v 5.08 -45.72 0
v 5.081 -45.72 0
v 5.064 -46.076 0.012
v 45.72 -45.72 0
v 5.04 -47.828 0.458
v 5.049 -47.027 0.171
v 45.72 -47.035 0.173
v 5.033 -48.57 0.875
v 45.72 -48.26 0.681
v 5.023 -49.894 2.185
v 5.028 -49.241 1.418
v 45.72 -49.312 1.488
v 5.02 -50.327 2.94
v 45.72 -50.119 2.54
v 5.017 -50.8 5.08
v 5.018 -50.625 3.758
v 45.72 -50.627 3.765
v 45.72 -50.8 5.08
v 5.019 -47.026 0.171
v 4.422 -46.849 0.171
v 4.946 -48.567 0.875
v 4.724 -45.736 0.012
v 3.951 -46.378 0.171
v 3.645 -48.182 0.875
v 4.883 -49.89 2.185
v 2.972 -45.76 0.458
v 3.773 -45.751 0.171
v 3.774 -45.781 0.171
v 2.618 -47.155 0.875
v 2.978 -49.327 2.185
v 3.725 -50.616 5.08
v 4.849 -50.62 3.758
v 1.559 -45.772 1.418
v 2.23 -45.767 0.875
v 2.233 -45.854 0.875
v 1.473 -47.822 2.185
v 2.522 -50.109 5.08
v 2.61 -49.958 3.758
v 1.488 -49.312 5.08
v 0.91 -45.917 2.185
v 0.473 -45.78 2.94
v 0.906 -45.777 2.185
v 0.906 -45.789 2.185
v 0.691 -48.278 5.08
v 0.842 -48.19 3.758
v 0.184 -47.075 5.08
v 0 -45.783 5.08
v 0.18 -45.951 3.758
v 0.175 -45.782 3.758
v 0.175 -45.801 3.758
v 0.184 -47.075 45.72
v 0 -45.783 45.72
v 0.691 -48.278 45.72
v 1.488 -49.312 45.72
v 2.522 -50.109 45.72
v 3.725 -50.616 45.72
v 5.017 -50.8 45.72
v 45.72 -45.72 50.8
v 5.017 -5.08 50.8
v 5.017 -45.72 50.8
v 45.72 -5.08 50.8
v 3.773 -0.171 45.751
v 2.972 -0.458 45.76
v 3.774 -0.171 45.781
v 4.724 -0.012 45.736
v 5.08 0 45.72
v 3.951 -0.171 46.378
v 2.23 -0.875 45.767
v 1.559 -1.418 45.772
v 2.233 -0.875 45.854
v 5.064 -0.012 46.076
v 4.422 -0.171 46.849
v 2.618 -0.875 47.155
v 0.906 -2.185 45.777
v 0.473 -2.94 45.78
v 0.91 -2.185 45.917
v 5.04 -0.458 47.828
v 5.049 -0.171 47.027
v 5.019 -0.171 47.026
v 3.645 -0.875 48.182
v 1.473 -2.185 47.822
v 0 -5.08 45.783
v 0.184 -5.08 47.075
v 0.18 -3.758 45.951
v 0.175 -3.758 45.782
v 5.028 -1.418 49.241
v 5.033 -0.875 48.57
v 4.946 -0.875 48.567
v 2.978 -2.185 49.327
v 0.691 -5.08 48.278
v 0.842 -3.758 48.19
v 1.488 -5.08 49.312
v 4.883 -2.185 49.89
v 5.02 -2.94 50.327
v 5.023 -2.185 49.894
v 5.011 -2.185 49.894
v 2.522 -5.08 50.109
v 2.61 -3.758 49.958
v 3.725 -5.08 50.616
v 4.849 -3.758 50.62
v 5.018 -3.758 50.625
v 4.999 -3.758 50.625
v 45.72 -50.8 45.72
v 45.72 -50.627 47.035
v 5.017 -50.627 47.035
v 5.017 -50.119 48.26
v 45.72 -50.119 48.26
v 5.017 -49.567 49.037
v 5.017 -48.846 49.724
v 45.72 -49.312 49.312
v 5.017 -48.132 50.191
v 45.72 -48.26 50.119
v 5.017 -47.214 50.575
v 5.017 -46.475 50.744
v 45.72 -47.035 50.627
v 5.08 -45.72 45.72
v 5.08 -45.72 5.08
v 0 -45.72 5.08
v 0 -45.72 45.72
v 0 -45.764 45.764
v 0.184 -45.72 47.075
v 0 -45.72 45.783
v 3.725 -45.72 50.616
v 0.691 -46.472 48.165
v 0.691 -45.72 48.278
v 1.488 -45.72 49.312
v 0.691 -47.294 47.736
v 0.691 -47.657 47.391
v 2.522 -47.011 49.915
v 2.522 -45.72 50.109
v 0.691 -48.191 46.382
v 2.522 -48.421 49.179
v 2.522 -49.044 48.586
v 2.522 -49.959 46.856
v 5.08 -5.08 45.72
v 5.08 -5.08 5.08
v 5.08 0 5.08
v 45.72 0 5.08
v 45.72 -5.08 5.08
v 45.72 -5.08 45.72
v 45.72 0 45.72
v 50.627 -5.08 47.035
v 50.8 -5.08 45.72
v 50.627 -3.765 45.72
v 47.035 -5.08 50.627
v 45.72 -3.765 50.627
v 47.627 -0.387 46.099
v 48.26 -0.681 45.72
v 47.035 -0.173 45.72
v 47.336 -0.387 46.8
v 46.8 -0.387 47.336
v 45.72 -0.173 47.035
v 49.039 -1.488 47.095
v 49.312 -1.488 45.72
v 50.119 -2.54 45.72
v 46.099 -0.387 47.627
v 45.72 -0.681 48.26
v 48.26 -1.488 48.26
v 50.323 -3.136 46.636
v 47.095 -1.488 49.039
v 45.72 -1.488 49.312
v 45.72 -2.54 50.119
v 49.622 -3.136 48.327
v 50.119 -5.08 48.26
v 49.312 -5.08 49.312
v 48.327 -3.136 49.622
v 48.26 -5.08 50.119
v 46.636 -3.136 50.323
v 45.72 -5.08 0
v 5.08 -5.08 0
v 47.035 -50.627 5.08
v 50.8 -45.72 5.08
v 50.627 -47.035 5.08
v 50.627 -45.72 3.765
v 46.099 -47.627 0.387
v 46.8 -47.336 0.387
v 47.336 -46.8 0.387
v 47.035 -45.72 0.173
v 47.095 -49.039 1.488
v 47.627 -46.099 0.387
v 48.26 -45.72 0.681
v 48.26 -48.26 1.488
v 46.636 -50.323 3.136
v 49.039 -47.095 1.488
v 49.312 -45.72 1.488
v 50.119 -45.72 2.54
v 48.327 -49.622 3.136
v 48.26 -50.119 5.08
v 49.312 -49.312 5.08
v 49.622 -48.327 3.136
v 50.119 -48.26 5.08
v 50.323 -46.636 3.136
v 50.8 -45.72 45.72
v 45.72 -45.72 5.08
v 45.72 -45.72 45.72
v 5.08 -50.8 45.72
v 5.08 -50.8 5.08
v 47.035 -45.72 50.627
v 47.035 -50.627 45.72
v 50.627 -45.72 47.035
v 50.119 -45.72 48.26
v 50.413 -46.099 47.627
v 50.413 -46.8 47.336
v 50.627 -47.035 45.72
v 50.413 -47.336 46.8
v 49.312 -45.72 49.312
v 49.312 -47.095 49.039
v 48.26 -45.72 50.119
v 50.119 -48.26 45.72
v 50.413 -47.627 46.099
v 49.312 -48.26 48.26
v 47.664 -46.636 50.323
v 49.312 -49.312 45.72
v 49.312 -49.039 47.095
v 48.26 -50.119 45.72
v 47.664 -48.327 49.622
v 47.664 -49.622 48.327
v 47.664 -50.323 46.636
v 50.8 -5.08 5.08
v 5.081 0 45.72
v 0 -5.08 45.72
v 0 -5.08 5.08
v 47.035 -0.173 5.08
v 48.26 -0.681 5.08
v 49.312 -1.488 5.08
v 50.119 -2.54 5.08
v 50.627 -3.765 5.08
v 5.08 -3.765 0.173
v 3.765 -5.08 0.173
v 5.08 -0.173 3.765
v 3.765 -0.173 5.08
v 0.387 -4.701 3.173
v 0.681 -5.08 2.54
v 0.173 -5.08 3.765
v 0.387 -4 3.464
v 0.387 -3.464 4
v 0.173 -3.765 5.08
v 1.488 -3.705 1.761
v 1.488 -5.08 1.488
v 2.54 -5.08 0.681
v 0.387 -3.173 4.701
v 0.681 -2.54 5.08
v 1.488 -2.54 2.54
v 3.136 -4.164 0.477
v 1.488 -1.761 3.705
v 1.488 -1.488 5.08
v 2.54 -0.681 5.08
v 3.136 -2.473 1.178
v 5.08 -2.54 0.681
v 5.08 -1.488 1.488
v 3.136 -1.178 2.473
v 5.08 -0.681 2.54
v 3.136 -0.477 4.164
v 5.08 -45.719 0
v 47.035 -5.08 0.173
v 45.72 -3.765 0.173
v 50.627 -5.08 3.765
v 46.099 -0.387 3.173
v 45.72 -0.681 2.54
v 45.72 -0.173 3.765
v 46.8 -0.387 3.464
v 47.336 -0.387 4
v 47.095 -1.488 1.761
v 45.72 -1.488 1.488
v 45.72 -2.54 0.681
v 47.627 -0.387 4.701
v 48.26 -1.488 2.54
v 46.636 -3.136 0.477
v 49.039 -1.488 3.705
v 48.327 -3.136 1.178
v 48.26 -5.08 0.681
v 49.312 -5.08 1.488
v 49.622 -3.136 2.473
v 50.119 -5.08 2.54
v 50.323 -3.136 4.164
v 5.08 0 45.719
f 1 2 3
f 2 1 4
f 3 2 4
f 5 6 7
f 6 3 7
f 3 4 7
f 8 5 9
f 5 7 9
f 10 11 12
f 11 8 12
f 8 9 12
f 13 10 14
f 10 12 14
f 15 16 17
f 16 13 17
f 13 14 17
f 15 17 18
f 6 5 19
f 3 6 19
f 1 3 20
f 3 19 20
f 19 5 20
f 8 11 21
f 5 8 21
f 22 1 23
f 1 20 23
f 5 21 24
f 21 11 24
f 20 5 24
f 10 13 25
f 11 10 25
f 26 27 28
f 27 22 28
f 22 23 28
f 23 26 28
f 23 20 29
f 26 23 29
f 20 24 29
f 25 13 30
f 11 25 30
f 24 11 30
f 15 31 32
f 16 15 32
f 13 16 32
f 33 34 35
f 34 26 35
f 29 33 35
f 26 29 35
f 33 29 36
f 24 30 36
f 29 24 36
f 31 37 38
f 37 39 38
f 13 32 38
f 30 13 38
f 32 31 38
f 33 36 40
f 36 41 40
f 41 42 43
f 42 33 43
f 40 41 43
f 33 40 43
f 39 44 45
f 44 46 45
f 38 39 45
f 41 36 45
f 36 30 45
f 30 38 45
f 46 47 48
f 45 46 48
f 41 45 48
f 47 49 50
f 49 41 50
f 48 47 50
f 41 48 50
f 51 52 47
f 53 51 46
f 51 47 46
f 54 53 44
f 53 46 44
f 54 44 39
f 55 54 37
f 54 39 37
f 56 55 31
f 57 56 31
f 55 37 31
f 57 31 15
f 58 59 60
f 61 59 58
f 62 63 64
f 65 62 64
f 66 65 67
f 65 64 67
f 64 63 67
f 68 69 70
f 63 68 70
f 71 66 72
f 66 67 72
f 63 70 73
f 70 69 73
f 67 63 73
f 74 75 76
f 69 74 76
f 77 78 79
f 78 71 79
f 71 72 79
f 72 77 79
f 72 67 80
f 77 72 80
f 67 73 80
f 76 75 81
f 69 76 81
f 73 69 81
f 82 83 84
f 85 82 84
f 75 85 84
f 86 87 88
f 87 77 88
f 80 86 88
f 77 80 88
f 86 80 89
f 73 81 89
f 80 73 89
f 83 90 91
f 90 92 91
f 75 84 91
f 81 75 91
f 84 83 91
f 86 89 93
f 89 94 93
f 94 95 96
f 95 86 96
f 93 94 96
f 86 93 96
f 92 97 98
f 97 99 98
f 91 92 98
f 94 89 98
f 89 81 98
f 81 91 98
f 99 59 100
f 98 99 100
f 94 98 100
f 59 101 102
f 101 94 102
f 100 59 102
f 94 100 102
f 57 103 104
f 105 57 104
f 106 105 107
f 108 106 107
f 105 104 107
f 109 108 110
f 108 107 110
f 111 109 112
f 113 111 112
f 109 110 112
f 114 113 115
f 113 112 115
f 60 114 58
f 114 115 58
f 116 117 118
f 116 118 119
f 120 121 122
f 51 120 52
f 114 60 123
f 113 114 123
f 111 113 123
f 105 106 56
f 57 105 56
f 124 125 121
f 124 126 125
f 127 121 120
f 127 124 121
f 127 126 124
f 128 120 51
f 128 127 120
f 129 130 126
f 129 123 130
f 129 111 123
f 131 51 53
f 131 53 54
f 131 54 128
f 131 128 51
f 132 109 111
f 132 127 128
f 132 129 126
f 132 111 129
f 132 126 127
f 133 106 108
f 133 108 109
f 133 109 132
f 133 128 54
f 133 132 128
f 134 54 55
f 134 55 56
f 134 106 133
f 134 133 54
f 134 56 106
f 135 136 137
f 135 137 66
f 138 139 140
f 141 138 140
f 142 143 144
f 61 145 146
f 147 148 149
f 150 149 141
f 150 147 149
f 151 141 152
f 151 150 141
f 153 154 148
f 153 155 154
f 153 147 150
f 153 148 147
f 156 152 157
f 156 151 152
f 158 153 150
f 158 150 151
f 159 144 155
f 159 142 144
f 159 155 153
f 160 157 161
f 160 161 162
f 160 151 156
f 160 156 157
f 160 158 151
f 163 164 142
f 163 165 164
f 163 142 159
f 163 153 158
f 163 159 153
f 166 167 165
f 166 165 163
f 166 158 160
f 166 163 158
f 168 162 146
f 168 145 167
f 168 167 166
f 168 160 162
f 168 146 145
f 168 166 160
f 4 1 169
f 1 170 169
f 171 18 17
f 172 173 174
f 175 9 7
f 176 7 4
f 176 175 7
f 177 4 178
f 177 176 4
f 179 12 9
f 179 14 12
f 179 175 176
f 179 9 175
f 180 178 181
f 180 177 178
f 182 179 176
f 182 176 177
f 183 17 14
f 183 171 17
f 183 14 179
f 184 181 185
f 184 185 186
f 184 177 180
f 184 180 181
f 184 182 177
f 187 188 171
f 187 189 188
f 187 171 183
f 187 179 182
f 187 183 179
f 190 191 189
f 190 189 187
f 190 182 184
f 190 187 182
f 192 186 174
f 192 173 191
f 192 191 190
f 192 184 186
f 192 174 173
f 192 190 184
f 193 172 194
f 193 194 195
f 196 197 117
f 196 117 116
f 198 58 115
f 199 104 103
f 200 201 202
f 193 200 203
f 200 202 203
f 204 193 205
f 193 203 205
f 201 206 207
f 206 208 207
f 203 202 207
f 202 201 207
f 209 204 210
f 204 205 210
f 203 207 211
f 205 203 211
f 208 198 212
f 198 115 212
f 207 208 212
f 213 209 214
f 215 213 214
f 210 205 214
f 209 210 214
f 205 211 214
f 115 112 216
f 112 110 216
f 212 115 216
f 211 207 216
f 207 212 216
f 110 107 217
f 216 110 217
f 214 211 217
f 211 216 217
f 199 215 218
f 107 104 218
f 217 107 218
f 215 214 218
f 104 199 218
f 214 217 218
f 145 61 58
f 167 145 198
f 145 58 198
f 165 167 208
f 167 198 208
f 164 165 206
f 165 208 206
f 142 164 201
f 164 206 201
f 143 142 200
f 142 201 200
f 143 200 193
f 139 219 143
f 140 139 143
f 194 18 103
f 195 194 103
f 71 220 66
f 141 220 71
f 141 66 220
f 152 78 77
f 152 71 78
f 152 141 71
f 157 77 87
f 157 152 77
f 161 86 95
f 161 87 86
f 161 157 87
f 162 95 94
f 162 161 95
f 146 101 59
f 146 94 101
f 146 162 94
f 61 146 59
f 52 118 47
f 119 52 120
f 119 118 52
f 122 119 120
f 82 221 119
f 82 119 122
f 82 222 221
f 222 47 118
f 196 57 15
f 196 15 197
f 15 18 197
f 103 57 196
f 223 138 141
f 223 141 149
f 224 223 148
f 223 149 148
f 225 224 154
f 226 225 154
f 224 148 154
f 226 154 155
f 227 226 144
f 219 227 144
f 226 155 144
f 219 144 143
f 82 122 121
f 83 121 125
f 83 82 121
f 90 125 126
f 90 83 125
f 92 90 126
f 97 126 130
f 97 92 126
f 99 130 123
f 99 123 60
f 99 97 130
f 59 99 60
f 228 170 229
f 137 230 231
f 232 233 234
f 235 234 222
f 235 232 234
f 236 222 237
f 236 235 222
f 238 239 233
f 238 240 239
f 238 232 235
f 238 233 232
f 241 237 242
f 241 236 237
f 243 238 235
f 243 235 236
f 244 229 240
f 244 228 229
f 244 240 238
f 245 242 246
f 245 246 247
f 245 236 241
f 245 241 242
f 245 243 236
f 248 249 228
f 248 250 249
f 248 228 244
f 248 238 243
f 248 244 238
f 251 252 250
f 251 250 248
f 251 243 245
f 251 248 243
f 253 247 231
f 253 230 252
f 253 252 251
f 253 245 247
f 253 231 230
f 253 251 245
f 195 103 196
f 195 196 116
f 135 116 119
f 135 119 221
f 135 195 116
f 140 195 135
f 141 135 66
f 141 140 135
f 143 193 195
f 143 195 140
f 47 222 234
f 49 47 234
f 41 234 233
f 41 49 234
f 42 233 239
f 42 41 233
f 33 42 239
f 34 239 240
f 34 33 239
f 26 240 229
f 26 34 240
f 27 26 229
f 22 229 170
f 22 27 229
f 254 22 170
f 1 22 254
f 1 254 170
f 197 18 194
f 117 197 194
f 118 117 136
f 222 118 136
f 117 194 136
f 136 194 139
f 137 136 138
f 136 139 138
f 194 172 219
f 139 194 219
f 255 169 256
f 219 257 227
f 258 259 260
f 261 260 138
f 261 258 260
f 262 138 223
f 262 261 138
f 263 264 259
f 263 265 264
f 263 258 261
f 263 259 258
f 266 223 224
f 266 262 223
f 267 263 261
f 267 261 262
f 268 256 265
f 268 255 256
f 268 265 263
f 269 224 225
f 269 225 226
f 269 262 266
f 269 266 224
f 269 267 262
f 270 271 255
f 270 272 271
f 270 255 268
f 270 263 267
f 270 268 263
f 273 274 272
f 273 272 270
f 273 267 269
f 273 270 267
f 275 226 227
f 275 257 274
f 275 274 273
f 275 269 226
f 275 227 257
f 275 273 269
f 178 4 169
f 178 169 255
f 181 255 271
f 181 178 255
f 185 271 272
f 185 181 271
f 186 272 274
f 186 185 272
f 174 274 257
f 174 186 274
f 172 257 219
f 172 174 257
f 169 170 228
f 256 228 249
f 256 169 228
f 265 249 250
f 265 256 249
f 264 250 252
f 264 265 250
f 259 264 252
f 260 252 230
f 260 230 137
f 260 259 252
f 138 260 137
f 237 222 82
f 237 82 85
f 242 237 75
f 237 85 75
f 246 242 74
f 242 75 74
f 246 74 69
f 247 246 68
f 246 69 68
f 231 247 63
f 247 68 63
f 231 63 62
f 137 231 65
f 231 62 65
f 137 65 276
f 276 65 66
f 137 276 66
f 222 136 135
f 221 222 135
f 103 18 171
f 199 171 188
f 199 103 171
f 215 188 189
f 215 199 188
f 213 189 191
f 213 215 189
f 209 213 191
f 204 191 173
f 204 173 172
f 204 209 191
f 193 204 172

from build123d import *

# Parameters (mm, degrees)
F0_W         = 50.8
F0_H         = 50.8
F1_DEPTH     = 50.8
F2_W         = 40.64
F2_H         = 40.64
F3_DEPTH     = 50.8
F4_W         = 40.64
F4_H         = 40.64
F5_DEPTH     = 50.8
F6_R         = 5.07999
F7_T1_DEPTH  = 58.4224242529
F7_T3_DEPTH  = 58.4224242529
F7_T6_ANGLE  = 90
F7_T8_ANGLE  = 90
F7_T10_ANGLE = 90


# Not quite as in the source:
# - a fillet or chamfer that OpenCascade refuses, or shapes differently, is made with other operations: its cross-section is extruded or revolved along the edge and cut away or added
# - a fillet or chamfer is up to 0.001 mm smaller than in the source, because OpenCascade refuses the exact size


with BuildPart() as f1:
    # F0 (on Front) → F1 (new body)
    with BuildSketch(Plane.XZ):
        with Locations((25.4, 25.4)):
            Rectangle(F0_W, F0_H)
    extrude(amount=F1_DEPTH)

    # F2 (on face) → F3 (cut)
    with BuildSketch(Plane.XZ.offset(50.8)):
        with Locations((25.4, 25.4)):
            Rectangle(F2_W, F2_H)
    extrude(amount=-F3_DEPTH, mode=Mode.SUBTRACT)

    # F4 (on face) → F5 (cut)
    with BuildSketch(Plane.YZ.offset(50.8)):
        with Locations((-25.4, 25.4)):
            Rectangle(F4_W, F4_H)
    extrude(amount=-F5_DEPTH, mode=Mode.SUBTRACT)

    # F6 (radius 5.08 in the source; OpenCascade refuses exactly that, so slightly less here)
    f6_edges = [f1.edges().sort_by_distance(p)[0] for p in [
        (25.4, -50.8, 50.8),
        (50.8, -25.4, 50.8),
        (50.8, -50.8, 25.4),
        (25.4, -50.8, 0),
        (50.8, -25.4, 0),
        (25.4, 0, 0),
        (0, -25.4, 0),
        (50.8, 0, 25.4),
        (25.4, 0, 50.8),
        (0, 0, 25.4),
    ]]
    fillet(f6_edges, radius=F6_R)

    # F7: fillet of radius 5.08 on 3 edges, made by hand

    # F7_s2 → F7_t1 (cut)
    with BuildSketch(Plane.XZ):
        with BuildLine():
            ThreePointArc((-0.0004, 45.7190343146), (1.4878975516, 49.3121024484), (5.0809656854, 50.8004))
            Line((5.0809656854, 50.8004), (5.0809656854, 51.3085365685))
            ThreePointArc((5.0809656854, 51.3085365685), (2.5404828427, 51.3081365685), (0, 51.3081365685))
            Line((0, 51.3081365685), (-0.5081365685, 50.8))
            ThreePointArc((-0.5081365685, 50.8), (-0.5081365685, 48.2595171573), (-0.5085365685, 45.7190343146))
            Line((-0.5085365685, 45.7190343146), (-0.0004, 45.7190343146))
        make_face()
    extrude(amount=F7_T1_DEPTH, mode=Mode.SUBTRACT)

    # F7_s4 → F7_t3 (cut)
    with BuildSketch(Plane.XY):
        with BuildLine():
            ThreePointArc((-0.0004, -45.7190343146), (1.4878975516, -49.3121024484), (5.0809656854, -50.8004))
            Line((5.0809656854, -50.8004), (5.0809656854, -51.3085365685))
            ThreePointArc((5.0809656854, -51.3085365685), (2.5404828427, -51.3081365685), (0, -51.3081365685))
            Line((0, -51.3081365685), (-0.5081365685, -50.8))
            ThreePointArc((-0.5081365685, -50.8), (-0.5081365685, -48.2595171573), (-0.5085365685, -45.7190343146))
            Line((-0.5085365685, -45.7190343146), (-0.0004, -45.7190343146))
        make_face()
    extrude(amount=F7_T3_DEPTH, mode=Mode.SUBTRACT)

    # F7_s5 → F7_t6 (revolve, cut)
    with BuildSketch(Plane.YZ.offset(5.0809656854)):
        with BuildLine():
            ThreePointArc((-45.72041, 0), (-49.3125053774, 1.4878946226), (-50.8004, 5.07999))
            Line((-50.8004, 5.07999), (-50.8004, 0))
            Line((-50.8004, 0), (-45.72041, 0))
        make_face()
    revolve(axis=Axis((5.0809656854, -45.7190343146, 0), (0, 0, -1)), revolution_arc=F7_T6_ANGLE, mode=Mode.SUBTRACT)

    # F7_s7 → F7_t8 (revolve, cut)
    with BuildSketch(Plane.XY.offset(45.7190343146)):
        with BuildLine():
            ThreePointArc((5.07959, 0), (1.4874946226, -1.4878946226), (-0.0004, -5.07999))
            Line((-0.0004, -5.07999), (-0.0004, 0))
            Line((-0.0004, 0), (5.07959, 0))
        make_face()
    revolve(axis=Axis((5.0809656854, 0, 45.7190343146), (0, 1, 0)), revolution_arc=F7_T8_ANGLE, mode=Mode.SUBTRACT)

    # F7_s9 → F7_t10 (revolve, cut)
    with BuildSketch(Plane.XZ.offset(45.72001)):
        with BuildLine():
            ThreePointArc((-0.0003999063, 45.72001), (1.488242525, 49.3124473888), (5.0809656854, 50.8004))
            Line((5.0809656854, 50.8004), (5.0809656854, 51.3085365685))
            ThreePointArc((5.0809656854, 51.3085365685), (2.5404828427, 51.3081365685), (0, 51.3081365685))
            Line((0, 51.3081365685), (-0.5081365685, 50.8))
            Line((-0.5081365685, 50.8), (-0.5085364917, 45.72001))
            Line((-0.5085364917, 45.72001), (-0.0003999063, 45.72001))
        make_face()
    revolve(axis=Axis((0, -45.72001, 45.72001), (1, 0, 0)), revolution_arc=F7_T10_ANGLE, mode=Mode.SUBTRACT)


solid = f1.part
